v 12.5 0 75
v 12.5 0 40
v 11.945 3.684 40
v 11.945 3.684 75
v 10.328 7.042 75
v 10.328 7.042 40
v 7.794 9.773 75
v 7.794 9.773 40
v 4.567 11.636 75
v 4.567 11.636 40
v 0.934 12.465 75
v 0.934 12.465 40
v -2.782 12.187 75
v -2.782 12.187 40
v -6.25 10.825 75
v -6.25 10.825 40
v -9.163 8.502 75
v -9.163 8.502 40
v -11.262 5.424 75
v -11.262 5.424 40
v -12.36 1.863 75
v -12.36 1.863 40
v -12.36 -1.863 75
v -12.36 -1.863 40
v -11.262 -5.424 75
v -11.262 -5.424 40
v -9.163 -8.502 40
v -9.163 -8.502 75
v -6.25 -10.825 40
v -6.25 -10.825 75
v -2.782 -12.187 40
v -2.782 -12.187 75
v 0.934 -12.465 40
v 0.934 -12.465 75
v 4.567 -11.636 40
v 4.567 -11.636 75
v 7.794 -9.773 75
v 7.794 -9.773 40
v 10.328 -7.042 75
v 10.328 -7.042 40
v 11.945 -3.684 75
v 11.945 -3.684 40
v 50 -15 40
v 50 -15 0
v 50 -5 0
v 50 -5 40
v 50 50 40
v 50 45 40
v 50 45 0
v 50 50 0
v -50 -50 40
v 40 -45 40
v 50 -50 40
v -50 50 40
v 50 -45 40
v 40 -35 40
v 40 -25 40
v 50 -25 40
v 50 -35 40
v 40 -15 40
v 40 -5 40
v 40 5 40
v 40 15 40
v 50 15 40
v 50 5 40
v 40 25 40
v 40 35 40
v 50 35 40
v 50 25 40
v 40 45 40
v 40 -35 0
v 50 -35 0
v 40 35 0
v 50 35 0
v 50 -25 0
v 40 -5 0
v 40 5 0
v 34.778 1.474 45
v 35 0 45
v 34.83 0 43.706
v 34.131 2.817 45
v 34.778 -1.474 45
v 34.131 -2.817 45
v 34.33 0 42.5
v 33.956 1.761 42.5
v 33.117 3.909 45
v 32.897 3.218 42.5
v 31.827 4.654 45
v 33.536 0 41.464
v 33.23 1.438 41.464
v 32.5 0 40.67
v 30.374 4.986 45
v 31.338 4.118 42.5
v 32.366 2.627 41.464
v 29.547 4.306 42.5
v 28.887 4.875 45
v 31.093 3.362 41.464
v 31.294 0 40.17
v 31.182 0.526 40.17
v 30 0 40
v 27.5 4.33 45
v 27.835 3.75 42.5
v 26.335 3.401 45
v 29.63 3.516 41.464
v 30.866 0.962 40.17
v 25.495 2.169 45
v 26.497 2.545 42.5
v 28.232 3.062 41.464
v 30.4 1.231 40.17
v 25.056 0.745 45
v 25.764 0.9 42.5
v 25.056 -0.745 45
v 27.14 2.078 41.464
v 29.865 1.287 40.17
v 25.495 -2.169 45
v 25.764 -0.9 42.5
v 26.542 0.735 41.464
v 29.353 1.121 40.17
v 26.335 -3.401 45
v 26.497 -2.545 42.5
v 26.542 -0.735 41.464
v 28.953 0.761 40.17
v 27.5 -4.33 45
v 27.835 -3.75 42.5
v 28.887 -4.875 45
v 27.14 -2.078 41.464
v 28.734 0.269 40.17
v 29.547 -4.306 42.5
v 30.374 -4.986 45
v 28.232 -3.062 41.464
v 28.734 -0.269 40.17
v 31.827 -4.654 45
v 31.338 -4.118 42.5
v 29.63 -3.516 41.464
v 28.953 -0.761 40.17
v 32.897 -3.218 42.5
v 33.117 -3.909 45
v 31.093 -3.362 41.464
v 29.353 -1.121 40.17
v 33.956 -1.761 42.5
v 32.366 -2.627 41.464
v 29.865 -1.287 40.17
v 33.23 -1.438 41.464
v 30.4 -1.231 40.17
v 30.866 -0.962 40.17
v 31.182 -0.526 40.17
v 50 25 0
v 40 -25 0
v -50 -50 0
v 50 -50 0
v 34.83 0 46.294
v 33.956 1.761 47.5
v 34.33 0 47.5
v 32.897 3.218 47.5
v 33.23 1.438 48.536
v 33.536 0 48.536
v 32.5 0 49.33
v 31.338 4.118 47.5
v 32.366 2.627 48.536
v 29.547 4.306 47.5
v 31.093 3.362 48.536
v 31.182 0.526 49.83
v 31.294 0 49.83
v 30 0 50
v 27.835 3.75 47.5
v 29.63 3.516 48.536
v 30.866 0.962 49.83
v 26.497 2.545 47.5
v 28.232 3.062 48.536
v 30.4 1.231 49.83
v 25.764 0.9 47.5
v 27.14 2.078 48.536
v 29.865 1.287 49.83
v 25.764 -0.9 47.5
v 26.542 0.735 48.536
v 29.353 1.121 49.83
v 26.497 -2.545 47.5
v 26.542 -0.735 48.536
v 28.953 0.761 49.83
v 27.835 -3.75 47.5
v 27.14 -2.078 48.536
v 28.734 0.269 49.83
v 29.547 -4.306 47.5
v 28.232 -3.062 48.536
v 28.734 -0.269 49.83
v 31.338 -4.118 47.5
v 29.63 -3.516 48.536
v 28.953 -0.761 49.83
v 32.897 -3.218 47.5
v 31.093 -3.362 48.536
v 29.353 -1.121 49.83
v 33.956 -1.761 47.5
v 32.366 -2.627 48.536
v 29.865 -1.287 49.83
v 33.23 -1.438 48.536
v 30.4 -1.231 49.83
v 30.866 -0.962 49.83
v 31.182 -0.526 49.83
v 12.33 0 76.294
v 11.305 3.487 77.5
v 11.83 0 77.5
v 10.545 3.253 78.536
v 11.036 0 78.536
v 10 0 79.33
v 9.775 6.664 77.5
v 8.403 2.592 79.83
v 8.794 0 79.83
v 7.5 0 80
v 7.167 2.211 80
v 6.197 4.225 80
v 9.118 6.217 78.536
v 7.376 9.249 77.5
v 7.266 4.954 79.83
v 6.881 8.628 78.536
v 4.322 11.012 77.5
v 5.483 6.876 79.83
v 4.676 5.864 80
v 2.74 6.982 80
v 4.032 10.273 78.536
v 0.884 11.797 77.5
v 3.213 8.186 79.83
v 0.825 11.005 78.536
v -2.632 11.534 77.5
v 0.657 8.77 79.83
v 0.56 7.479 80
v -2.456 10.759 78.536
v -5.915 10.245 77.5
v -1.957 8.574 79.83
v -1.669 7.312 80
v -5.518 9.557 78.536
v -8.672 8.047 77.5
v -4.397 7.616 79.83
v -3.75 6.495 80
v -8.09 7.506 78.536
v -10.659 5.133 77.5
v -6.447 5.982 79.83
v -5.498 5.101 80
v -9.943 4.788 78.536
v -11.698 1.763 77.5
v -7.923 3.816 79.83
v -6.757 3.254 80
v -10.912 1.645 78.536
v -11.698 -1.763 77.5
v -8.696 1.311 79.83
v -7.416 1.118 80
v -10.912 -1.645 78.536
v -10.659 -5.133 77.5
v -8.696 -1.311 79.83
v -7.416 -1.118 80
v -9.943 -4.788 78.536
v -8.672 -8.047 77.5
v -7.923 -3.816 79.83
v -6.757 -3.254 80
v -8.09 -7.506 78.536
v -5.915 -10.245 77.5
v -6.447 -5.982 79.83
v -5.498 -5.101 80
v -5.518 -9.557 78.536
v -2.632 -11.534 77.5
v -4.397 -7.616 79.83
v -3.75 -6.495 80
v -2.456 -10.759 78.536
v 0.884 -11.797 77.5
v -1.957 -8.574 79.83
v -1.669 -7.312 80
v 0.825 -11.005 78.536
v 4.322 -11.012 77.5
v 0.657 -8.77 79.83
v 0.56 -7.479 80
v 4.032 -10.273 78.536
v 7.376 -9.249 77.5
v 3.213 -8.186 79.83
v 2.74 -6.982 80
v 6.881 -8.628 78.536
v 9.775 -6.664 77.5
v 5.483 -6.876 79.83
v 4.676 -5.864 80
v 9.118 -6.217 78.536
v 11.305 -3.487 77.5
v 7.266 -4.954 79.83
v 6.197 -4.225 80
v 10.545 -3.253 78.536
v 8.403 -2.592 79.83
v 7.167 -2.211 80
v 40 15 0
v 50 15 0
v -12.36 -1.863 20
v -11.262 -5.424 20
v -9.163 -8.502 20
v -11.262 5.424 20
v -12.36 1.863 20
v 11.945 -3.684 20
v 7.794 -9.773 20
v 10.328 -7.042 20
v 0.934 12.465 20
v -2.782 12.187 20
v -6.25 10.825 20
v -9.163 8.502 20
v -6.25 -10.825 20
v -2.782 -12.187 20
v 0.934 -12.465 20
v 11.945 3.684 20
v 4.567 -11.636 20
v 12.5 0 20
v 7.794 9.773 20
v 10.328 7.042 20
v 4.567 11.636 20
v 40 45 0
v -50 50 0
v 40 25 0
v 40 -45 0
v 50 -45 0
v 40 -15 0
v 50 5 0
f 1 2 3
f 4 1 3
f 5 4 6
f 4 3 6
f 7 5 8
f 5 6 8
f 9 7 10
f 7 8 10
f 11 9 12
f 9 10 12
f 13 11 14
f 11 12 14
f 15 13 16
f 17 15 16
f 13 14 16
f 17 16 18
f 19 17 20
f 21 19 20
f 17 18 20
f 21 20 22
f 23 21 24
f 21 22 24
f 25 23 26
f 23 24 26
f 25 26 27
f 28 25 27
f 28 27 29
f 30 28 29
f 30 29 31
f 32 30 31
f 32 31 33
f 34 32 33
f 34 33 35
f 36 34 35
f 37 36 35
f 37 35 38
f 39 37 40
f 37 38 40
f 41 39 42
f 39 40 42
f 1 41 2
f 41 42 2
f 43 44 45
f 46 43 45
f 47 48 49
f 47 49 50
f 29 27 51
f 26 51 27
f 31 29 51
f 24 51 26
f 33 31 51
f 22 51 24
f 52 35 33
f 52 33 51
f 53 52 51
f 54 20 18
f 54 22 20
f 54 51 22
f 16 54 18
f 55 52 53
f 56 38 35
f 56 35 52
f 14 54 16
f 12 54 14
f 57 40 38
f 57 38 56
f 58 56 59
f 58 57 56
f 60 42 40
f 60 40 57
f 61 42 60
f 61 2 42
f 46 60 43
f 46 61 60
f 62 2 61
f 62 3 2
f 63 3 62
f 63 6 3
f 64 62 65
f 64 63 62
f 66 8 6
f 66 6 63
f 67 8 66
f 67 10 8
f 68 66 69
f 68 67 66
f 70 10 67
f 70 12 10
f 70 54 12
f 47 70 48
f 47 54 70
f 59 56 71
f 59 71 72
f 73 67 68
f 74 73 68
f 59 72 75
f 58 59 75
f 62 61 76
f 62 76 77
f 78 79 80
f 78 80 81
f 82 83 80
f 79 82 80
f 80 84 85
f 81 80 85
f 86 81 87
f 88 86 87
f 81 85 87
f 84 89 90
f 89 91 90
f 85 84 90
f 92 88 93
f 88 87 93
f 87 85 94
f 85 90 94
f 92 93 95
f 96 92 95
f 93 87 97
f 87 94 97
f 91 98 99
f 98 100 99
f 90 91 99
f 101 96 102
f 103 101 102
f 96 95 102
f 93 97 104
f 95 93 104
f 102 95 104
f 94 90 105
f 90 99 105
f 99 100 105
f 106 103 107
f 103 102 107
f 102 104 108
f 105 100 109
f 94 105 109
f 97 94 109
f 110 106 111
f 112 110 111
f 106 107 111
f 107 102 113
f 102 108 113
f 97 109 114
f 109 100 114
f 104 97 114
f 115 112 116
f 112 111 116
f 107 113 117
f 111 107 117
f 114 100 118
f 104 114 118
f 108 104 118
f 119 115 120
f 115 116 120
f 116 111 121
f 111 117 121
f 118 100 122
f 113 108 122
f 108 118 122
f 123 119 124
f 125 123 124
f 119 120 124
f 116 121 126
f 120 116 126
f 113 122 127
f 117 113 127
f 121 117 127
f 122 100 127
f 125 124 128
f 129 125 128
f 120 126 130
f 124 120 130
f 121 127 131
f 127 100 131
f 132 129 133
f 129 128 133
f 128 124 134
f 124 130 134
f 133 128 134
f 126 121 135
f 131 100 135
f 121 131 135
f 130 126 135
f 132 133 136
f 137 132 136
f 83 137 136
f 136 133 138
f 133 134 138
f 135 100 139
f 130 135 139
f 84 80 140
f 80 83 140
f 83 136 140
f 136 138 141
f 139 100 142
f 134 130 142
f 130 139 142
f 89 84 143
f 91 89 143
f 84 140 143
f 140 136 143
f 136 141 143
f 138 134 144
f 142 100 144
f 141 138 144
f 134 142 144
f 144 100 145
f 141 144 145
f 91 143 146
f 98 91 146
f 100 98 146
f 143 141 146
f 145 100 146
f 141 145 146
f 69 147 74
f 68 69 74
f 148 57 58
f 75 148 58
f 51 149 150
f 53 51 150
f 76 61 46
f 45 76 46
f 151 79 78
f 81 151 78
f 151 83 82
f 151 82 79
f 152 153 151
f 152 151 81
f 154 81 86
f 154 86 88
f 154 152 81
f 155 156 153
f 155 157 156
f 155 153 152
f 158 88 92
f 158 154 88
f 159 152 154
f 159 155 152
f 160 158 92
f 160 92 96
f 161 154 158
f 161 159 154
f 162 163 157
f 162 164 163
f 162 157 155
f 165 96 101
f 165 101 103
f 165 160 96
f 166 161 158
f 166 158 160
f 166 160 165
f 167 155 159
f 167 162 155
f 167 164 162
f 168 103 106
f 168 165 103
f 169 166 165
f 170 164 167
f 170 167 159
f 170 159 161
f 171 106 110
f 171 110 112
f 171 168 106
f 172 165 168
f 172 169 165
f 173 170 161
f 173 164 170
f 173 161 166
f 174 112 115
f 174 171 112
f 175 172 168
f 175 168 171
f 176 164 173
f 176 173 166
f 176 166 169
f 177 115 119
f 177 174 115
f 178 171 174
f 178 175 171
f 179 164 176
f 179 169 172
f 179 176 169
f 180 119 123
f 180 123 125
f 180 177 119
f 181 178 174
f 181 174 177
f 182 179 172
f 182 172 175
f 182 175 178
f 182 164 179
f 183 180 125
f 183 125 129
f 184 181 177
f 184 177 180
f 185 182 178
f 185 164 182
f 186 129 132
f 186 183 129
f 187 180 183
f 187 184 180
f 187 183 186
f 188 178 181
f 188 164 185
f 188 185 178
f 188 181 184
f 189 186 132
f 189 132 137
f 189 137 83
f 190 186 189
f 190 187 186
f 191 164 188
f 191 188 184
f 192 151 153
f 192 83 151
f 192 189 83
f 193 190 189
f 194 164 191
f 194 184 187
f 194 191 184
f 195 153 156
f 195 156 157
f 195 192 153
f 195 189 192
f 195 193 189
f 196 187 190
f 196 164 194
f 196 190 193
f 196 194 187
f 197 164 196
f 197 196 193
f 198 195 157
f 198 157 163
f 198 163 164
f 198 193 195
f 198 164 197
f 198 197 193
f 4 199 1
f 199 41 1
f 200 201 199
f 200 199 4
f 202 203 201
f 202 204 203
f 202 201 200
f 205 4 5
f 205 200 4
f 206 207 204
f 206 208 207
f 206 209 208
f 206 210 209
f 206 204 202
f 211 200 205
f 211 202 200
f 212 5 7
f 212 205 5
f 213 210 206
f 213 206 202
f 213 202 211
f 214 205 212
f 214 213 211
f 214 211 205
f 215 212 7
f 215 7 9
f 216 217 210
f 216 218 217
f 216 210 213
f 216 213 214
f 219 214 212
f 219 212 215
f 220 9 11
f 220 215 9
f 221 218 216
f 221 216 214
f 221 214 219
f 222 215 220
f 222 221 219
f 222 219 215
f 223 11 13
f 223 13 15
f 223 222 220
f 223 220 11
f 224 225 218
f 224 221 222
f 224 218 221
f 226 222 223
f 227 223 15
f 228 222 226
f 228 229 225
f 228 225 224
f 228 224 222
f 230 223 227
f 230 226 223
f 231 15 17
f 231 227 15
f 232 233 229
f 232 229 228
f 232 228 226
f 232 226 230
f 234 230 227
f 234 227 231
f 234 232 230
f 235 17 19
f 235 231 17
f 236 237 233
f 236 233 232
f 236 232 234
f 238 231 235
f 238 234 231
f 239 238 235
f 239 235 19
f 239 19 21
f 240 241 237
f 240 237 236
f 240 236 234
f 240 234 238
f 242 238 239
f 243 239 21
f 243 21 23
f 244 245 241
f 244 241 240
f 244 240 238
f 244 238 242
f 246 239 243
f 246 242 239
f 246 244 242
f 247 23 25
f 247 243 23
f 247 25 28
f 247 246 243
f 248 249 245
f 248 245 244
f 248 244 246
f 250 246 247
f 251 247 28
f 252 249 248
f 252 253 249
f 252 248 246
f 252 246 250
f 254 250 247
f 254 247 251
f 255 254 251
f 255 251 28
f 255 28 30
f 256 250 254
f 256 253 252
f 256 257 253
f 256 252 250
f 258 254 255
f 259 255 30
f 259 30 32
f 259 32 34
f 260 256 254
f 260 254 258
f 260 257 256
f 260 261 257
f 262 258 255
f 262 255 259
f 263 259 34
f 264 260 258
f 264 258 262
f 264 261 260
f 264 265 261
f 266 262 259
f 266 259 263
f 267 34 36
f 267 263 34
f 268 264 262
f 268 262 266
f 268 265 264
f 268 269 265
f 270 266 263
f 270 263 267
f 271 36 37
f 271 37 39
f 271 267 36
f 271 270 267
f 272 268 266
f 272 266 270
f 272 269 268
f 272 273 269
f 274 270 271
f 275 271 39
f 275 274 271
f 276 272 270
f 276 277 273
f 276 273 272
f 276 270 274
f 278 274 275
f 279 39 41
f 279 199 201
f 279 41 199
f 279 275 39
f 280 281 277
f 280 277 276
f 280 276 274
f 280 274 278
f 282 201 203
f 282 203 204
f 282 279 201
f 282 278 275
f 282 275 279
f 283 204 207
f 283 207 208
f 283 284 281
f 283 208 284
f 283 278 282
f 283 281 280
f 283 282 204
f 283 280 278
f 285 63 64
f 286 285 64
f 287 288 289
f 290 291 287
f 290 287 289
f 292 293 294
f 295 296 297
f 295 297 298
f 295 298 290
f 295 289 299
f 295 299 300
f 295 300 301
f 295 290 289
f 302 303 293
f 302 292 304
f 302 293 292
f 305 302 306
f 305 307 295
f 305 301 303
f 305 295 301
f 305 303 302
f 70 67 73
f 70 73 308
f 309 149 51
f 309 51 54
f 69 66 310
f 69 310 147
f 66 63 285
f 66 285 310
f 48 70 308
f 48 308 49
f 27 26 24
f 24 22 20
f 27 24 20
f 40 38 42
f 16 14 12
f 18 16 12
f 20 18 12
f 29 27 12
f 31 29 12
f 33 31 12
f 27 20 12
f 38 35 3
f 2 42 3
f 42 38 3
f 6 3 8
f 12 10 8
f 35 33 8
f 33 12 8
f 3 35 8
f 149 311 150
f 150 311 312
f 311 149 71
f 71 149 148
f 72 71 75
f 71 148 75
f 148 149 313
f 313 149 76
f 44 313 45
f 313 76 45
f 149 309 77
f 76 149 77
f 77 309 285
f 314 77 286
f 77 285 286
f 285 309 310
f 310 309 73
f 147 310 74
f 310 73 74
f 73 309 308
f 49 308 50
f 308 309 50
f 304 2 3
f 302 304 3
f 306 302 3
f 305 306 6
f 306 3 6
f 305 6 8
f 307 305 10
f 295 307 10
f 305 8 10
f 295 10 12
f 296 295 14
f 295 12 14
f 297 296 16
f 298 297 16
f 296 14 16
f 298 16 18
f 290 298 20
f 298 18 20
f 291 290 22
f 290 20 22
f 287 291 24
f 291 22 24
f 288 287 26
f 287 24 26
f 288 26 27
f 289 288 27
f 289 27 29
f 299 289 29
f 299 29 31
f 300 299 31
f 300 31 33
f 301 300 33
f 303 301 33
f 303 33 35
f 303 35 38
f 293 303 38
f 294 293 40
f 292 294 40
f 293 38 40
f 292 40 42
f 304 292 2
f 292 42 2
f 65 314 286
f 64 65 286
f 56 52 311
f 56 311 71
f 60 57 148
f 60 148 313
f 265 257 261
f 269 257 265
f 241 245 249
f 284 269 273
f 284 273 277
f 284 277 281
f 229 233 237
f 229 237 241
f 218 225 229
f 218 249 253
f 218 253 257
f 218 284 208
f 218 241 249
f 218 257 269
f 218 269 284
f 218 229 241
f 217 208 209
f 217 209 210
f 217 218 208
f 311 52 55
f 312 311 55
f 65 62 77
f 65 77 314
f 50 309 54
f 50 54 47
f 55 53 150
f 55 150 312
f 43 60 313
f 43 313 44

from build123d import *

# Parameters (mm, degrees)
F0_W      = 100
F0_H      = 100
F1_DEPTH  = 40
F3_R      = 12.5
F4_DEPTH  = 20
F5_DEPTH  = 40
F6_R      = 5
F7_W      = 10
F7_H      = 10
F8_DEPTH  = 40
F9_R      = 5
F10_DEPTH = 10
F11_R     = 4.99999


# Not quite as in the source:
# - a fillet or chamfer is up to 0.001 mm smaller than in the source, because OpenCascade refuses the exact size
# - a feature names something its author has since deleted; it is built from what else it names


with BuildPart() as f1:
    # F0 (on Top) → F1 (new body)
    with BuildSketch(Plane.XY):
        Rectangle(F0_W, F0_H)
    extrude(amount=F1_DEPTH)

    # F3 (on offset) → F4 (cut)
    with BuildSketch(Plane.XY.offset(40)):
        Circle(F3_R)
    extrude(amount=-F4_DEPTH, mode=Mode.SUBTRACT)

    # F7 (on face) → F8 (cut)
    with BuildSketch(Plane.XY.offset(40)):
        with Locations((45, 40)):
            Rectangle(F7_W, F7_H)
        with Locations((45, 20)):
            Rectangle(F7_W, F7_H)
        with Locations((45, 0)):
            Rectangle(F7_W, F7_H)
        with Locations((45, -20)):
            Rectangle(F7_W, F7_H)
        with Locations((45, -40)):
            Rectangle(F7_W, F7_H)
    extrude(amount=-F8_DEPTH, mode=Mode.SUBTRACT)


with BuildPart() as f5:
    # F3 (on offset) → F5 (new body)
    with BuildSketch(Plane.XY.offset(40)):
        Circle(F3_R)
    extrude(amount=F5_DEPTH)

    # F6
    f6_edges = [f5.edges().sort_by_distance(p)[0] for p in [
        (-12.5, 0, 80),
    ]]
    fillet(f6_edges, radius=F6_R)


with BuildPart() as f10:
    # F9 (on offset) → F10 (new body)
    with BuildSketch(Plane.XY.offset(40)):
        with Locations((30, 0)):
            Circle(F9_R)
    extrude(amount=F10_DEPTH)

    # F11 (radius 5 in the source; OpenCascade refuses exactly that, so slightly less here)
    f11_edges = [f10.edges().sort_by_distance(p)[0] for p in [
        (25, 0, 50),
        (35, 0, 45),
        (25, 0, 40),
    ]]
    fillet(f11_edges, radius=F11_R)


solid = Compound([f1.part, f5.part, f10.part])
